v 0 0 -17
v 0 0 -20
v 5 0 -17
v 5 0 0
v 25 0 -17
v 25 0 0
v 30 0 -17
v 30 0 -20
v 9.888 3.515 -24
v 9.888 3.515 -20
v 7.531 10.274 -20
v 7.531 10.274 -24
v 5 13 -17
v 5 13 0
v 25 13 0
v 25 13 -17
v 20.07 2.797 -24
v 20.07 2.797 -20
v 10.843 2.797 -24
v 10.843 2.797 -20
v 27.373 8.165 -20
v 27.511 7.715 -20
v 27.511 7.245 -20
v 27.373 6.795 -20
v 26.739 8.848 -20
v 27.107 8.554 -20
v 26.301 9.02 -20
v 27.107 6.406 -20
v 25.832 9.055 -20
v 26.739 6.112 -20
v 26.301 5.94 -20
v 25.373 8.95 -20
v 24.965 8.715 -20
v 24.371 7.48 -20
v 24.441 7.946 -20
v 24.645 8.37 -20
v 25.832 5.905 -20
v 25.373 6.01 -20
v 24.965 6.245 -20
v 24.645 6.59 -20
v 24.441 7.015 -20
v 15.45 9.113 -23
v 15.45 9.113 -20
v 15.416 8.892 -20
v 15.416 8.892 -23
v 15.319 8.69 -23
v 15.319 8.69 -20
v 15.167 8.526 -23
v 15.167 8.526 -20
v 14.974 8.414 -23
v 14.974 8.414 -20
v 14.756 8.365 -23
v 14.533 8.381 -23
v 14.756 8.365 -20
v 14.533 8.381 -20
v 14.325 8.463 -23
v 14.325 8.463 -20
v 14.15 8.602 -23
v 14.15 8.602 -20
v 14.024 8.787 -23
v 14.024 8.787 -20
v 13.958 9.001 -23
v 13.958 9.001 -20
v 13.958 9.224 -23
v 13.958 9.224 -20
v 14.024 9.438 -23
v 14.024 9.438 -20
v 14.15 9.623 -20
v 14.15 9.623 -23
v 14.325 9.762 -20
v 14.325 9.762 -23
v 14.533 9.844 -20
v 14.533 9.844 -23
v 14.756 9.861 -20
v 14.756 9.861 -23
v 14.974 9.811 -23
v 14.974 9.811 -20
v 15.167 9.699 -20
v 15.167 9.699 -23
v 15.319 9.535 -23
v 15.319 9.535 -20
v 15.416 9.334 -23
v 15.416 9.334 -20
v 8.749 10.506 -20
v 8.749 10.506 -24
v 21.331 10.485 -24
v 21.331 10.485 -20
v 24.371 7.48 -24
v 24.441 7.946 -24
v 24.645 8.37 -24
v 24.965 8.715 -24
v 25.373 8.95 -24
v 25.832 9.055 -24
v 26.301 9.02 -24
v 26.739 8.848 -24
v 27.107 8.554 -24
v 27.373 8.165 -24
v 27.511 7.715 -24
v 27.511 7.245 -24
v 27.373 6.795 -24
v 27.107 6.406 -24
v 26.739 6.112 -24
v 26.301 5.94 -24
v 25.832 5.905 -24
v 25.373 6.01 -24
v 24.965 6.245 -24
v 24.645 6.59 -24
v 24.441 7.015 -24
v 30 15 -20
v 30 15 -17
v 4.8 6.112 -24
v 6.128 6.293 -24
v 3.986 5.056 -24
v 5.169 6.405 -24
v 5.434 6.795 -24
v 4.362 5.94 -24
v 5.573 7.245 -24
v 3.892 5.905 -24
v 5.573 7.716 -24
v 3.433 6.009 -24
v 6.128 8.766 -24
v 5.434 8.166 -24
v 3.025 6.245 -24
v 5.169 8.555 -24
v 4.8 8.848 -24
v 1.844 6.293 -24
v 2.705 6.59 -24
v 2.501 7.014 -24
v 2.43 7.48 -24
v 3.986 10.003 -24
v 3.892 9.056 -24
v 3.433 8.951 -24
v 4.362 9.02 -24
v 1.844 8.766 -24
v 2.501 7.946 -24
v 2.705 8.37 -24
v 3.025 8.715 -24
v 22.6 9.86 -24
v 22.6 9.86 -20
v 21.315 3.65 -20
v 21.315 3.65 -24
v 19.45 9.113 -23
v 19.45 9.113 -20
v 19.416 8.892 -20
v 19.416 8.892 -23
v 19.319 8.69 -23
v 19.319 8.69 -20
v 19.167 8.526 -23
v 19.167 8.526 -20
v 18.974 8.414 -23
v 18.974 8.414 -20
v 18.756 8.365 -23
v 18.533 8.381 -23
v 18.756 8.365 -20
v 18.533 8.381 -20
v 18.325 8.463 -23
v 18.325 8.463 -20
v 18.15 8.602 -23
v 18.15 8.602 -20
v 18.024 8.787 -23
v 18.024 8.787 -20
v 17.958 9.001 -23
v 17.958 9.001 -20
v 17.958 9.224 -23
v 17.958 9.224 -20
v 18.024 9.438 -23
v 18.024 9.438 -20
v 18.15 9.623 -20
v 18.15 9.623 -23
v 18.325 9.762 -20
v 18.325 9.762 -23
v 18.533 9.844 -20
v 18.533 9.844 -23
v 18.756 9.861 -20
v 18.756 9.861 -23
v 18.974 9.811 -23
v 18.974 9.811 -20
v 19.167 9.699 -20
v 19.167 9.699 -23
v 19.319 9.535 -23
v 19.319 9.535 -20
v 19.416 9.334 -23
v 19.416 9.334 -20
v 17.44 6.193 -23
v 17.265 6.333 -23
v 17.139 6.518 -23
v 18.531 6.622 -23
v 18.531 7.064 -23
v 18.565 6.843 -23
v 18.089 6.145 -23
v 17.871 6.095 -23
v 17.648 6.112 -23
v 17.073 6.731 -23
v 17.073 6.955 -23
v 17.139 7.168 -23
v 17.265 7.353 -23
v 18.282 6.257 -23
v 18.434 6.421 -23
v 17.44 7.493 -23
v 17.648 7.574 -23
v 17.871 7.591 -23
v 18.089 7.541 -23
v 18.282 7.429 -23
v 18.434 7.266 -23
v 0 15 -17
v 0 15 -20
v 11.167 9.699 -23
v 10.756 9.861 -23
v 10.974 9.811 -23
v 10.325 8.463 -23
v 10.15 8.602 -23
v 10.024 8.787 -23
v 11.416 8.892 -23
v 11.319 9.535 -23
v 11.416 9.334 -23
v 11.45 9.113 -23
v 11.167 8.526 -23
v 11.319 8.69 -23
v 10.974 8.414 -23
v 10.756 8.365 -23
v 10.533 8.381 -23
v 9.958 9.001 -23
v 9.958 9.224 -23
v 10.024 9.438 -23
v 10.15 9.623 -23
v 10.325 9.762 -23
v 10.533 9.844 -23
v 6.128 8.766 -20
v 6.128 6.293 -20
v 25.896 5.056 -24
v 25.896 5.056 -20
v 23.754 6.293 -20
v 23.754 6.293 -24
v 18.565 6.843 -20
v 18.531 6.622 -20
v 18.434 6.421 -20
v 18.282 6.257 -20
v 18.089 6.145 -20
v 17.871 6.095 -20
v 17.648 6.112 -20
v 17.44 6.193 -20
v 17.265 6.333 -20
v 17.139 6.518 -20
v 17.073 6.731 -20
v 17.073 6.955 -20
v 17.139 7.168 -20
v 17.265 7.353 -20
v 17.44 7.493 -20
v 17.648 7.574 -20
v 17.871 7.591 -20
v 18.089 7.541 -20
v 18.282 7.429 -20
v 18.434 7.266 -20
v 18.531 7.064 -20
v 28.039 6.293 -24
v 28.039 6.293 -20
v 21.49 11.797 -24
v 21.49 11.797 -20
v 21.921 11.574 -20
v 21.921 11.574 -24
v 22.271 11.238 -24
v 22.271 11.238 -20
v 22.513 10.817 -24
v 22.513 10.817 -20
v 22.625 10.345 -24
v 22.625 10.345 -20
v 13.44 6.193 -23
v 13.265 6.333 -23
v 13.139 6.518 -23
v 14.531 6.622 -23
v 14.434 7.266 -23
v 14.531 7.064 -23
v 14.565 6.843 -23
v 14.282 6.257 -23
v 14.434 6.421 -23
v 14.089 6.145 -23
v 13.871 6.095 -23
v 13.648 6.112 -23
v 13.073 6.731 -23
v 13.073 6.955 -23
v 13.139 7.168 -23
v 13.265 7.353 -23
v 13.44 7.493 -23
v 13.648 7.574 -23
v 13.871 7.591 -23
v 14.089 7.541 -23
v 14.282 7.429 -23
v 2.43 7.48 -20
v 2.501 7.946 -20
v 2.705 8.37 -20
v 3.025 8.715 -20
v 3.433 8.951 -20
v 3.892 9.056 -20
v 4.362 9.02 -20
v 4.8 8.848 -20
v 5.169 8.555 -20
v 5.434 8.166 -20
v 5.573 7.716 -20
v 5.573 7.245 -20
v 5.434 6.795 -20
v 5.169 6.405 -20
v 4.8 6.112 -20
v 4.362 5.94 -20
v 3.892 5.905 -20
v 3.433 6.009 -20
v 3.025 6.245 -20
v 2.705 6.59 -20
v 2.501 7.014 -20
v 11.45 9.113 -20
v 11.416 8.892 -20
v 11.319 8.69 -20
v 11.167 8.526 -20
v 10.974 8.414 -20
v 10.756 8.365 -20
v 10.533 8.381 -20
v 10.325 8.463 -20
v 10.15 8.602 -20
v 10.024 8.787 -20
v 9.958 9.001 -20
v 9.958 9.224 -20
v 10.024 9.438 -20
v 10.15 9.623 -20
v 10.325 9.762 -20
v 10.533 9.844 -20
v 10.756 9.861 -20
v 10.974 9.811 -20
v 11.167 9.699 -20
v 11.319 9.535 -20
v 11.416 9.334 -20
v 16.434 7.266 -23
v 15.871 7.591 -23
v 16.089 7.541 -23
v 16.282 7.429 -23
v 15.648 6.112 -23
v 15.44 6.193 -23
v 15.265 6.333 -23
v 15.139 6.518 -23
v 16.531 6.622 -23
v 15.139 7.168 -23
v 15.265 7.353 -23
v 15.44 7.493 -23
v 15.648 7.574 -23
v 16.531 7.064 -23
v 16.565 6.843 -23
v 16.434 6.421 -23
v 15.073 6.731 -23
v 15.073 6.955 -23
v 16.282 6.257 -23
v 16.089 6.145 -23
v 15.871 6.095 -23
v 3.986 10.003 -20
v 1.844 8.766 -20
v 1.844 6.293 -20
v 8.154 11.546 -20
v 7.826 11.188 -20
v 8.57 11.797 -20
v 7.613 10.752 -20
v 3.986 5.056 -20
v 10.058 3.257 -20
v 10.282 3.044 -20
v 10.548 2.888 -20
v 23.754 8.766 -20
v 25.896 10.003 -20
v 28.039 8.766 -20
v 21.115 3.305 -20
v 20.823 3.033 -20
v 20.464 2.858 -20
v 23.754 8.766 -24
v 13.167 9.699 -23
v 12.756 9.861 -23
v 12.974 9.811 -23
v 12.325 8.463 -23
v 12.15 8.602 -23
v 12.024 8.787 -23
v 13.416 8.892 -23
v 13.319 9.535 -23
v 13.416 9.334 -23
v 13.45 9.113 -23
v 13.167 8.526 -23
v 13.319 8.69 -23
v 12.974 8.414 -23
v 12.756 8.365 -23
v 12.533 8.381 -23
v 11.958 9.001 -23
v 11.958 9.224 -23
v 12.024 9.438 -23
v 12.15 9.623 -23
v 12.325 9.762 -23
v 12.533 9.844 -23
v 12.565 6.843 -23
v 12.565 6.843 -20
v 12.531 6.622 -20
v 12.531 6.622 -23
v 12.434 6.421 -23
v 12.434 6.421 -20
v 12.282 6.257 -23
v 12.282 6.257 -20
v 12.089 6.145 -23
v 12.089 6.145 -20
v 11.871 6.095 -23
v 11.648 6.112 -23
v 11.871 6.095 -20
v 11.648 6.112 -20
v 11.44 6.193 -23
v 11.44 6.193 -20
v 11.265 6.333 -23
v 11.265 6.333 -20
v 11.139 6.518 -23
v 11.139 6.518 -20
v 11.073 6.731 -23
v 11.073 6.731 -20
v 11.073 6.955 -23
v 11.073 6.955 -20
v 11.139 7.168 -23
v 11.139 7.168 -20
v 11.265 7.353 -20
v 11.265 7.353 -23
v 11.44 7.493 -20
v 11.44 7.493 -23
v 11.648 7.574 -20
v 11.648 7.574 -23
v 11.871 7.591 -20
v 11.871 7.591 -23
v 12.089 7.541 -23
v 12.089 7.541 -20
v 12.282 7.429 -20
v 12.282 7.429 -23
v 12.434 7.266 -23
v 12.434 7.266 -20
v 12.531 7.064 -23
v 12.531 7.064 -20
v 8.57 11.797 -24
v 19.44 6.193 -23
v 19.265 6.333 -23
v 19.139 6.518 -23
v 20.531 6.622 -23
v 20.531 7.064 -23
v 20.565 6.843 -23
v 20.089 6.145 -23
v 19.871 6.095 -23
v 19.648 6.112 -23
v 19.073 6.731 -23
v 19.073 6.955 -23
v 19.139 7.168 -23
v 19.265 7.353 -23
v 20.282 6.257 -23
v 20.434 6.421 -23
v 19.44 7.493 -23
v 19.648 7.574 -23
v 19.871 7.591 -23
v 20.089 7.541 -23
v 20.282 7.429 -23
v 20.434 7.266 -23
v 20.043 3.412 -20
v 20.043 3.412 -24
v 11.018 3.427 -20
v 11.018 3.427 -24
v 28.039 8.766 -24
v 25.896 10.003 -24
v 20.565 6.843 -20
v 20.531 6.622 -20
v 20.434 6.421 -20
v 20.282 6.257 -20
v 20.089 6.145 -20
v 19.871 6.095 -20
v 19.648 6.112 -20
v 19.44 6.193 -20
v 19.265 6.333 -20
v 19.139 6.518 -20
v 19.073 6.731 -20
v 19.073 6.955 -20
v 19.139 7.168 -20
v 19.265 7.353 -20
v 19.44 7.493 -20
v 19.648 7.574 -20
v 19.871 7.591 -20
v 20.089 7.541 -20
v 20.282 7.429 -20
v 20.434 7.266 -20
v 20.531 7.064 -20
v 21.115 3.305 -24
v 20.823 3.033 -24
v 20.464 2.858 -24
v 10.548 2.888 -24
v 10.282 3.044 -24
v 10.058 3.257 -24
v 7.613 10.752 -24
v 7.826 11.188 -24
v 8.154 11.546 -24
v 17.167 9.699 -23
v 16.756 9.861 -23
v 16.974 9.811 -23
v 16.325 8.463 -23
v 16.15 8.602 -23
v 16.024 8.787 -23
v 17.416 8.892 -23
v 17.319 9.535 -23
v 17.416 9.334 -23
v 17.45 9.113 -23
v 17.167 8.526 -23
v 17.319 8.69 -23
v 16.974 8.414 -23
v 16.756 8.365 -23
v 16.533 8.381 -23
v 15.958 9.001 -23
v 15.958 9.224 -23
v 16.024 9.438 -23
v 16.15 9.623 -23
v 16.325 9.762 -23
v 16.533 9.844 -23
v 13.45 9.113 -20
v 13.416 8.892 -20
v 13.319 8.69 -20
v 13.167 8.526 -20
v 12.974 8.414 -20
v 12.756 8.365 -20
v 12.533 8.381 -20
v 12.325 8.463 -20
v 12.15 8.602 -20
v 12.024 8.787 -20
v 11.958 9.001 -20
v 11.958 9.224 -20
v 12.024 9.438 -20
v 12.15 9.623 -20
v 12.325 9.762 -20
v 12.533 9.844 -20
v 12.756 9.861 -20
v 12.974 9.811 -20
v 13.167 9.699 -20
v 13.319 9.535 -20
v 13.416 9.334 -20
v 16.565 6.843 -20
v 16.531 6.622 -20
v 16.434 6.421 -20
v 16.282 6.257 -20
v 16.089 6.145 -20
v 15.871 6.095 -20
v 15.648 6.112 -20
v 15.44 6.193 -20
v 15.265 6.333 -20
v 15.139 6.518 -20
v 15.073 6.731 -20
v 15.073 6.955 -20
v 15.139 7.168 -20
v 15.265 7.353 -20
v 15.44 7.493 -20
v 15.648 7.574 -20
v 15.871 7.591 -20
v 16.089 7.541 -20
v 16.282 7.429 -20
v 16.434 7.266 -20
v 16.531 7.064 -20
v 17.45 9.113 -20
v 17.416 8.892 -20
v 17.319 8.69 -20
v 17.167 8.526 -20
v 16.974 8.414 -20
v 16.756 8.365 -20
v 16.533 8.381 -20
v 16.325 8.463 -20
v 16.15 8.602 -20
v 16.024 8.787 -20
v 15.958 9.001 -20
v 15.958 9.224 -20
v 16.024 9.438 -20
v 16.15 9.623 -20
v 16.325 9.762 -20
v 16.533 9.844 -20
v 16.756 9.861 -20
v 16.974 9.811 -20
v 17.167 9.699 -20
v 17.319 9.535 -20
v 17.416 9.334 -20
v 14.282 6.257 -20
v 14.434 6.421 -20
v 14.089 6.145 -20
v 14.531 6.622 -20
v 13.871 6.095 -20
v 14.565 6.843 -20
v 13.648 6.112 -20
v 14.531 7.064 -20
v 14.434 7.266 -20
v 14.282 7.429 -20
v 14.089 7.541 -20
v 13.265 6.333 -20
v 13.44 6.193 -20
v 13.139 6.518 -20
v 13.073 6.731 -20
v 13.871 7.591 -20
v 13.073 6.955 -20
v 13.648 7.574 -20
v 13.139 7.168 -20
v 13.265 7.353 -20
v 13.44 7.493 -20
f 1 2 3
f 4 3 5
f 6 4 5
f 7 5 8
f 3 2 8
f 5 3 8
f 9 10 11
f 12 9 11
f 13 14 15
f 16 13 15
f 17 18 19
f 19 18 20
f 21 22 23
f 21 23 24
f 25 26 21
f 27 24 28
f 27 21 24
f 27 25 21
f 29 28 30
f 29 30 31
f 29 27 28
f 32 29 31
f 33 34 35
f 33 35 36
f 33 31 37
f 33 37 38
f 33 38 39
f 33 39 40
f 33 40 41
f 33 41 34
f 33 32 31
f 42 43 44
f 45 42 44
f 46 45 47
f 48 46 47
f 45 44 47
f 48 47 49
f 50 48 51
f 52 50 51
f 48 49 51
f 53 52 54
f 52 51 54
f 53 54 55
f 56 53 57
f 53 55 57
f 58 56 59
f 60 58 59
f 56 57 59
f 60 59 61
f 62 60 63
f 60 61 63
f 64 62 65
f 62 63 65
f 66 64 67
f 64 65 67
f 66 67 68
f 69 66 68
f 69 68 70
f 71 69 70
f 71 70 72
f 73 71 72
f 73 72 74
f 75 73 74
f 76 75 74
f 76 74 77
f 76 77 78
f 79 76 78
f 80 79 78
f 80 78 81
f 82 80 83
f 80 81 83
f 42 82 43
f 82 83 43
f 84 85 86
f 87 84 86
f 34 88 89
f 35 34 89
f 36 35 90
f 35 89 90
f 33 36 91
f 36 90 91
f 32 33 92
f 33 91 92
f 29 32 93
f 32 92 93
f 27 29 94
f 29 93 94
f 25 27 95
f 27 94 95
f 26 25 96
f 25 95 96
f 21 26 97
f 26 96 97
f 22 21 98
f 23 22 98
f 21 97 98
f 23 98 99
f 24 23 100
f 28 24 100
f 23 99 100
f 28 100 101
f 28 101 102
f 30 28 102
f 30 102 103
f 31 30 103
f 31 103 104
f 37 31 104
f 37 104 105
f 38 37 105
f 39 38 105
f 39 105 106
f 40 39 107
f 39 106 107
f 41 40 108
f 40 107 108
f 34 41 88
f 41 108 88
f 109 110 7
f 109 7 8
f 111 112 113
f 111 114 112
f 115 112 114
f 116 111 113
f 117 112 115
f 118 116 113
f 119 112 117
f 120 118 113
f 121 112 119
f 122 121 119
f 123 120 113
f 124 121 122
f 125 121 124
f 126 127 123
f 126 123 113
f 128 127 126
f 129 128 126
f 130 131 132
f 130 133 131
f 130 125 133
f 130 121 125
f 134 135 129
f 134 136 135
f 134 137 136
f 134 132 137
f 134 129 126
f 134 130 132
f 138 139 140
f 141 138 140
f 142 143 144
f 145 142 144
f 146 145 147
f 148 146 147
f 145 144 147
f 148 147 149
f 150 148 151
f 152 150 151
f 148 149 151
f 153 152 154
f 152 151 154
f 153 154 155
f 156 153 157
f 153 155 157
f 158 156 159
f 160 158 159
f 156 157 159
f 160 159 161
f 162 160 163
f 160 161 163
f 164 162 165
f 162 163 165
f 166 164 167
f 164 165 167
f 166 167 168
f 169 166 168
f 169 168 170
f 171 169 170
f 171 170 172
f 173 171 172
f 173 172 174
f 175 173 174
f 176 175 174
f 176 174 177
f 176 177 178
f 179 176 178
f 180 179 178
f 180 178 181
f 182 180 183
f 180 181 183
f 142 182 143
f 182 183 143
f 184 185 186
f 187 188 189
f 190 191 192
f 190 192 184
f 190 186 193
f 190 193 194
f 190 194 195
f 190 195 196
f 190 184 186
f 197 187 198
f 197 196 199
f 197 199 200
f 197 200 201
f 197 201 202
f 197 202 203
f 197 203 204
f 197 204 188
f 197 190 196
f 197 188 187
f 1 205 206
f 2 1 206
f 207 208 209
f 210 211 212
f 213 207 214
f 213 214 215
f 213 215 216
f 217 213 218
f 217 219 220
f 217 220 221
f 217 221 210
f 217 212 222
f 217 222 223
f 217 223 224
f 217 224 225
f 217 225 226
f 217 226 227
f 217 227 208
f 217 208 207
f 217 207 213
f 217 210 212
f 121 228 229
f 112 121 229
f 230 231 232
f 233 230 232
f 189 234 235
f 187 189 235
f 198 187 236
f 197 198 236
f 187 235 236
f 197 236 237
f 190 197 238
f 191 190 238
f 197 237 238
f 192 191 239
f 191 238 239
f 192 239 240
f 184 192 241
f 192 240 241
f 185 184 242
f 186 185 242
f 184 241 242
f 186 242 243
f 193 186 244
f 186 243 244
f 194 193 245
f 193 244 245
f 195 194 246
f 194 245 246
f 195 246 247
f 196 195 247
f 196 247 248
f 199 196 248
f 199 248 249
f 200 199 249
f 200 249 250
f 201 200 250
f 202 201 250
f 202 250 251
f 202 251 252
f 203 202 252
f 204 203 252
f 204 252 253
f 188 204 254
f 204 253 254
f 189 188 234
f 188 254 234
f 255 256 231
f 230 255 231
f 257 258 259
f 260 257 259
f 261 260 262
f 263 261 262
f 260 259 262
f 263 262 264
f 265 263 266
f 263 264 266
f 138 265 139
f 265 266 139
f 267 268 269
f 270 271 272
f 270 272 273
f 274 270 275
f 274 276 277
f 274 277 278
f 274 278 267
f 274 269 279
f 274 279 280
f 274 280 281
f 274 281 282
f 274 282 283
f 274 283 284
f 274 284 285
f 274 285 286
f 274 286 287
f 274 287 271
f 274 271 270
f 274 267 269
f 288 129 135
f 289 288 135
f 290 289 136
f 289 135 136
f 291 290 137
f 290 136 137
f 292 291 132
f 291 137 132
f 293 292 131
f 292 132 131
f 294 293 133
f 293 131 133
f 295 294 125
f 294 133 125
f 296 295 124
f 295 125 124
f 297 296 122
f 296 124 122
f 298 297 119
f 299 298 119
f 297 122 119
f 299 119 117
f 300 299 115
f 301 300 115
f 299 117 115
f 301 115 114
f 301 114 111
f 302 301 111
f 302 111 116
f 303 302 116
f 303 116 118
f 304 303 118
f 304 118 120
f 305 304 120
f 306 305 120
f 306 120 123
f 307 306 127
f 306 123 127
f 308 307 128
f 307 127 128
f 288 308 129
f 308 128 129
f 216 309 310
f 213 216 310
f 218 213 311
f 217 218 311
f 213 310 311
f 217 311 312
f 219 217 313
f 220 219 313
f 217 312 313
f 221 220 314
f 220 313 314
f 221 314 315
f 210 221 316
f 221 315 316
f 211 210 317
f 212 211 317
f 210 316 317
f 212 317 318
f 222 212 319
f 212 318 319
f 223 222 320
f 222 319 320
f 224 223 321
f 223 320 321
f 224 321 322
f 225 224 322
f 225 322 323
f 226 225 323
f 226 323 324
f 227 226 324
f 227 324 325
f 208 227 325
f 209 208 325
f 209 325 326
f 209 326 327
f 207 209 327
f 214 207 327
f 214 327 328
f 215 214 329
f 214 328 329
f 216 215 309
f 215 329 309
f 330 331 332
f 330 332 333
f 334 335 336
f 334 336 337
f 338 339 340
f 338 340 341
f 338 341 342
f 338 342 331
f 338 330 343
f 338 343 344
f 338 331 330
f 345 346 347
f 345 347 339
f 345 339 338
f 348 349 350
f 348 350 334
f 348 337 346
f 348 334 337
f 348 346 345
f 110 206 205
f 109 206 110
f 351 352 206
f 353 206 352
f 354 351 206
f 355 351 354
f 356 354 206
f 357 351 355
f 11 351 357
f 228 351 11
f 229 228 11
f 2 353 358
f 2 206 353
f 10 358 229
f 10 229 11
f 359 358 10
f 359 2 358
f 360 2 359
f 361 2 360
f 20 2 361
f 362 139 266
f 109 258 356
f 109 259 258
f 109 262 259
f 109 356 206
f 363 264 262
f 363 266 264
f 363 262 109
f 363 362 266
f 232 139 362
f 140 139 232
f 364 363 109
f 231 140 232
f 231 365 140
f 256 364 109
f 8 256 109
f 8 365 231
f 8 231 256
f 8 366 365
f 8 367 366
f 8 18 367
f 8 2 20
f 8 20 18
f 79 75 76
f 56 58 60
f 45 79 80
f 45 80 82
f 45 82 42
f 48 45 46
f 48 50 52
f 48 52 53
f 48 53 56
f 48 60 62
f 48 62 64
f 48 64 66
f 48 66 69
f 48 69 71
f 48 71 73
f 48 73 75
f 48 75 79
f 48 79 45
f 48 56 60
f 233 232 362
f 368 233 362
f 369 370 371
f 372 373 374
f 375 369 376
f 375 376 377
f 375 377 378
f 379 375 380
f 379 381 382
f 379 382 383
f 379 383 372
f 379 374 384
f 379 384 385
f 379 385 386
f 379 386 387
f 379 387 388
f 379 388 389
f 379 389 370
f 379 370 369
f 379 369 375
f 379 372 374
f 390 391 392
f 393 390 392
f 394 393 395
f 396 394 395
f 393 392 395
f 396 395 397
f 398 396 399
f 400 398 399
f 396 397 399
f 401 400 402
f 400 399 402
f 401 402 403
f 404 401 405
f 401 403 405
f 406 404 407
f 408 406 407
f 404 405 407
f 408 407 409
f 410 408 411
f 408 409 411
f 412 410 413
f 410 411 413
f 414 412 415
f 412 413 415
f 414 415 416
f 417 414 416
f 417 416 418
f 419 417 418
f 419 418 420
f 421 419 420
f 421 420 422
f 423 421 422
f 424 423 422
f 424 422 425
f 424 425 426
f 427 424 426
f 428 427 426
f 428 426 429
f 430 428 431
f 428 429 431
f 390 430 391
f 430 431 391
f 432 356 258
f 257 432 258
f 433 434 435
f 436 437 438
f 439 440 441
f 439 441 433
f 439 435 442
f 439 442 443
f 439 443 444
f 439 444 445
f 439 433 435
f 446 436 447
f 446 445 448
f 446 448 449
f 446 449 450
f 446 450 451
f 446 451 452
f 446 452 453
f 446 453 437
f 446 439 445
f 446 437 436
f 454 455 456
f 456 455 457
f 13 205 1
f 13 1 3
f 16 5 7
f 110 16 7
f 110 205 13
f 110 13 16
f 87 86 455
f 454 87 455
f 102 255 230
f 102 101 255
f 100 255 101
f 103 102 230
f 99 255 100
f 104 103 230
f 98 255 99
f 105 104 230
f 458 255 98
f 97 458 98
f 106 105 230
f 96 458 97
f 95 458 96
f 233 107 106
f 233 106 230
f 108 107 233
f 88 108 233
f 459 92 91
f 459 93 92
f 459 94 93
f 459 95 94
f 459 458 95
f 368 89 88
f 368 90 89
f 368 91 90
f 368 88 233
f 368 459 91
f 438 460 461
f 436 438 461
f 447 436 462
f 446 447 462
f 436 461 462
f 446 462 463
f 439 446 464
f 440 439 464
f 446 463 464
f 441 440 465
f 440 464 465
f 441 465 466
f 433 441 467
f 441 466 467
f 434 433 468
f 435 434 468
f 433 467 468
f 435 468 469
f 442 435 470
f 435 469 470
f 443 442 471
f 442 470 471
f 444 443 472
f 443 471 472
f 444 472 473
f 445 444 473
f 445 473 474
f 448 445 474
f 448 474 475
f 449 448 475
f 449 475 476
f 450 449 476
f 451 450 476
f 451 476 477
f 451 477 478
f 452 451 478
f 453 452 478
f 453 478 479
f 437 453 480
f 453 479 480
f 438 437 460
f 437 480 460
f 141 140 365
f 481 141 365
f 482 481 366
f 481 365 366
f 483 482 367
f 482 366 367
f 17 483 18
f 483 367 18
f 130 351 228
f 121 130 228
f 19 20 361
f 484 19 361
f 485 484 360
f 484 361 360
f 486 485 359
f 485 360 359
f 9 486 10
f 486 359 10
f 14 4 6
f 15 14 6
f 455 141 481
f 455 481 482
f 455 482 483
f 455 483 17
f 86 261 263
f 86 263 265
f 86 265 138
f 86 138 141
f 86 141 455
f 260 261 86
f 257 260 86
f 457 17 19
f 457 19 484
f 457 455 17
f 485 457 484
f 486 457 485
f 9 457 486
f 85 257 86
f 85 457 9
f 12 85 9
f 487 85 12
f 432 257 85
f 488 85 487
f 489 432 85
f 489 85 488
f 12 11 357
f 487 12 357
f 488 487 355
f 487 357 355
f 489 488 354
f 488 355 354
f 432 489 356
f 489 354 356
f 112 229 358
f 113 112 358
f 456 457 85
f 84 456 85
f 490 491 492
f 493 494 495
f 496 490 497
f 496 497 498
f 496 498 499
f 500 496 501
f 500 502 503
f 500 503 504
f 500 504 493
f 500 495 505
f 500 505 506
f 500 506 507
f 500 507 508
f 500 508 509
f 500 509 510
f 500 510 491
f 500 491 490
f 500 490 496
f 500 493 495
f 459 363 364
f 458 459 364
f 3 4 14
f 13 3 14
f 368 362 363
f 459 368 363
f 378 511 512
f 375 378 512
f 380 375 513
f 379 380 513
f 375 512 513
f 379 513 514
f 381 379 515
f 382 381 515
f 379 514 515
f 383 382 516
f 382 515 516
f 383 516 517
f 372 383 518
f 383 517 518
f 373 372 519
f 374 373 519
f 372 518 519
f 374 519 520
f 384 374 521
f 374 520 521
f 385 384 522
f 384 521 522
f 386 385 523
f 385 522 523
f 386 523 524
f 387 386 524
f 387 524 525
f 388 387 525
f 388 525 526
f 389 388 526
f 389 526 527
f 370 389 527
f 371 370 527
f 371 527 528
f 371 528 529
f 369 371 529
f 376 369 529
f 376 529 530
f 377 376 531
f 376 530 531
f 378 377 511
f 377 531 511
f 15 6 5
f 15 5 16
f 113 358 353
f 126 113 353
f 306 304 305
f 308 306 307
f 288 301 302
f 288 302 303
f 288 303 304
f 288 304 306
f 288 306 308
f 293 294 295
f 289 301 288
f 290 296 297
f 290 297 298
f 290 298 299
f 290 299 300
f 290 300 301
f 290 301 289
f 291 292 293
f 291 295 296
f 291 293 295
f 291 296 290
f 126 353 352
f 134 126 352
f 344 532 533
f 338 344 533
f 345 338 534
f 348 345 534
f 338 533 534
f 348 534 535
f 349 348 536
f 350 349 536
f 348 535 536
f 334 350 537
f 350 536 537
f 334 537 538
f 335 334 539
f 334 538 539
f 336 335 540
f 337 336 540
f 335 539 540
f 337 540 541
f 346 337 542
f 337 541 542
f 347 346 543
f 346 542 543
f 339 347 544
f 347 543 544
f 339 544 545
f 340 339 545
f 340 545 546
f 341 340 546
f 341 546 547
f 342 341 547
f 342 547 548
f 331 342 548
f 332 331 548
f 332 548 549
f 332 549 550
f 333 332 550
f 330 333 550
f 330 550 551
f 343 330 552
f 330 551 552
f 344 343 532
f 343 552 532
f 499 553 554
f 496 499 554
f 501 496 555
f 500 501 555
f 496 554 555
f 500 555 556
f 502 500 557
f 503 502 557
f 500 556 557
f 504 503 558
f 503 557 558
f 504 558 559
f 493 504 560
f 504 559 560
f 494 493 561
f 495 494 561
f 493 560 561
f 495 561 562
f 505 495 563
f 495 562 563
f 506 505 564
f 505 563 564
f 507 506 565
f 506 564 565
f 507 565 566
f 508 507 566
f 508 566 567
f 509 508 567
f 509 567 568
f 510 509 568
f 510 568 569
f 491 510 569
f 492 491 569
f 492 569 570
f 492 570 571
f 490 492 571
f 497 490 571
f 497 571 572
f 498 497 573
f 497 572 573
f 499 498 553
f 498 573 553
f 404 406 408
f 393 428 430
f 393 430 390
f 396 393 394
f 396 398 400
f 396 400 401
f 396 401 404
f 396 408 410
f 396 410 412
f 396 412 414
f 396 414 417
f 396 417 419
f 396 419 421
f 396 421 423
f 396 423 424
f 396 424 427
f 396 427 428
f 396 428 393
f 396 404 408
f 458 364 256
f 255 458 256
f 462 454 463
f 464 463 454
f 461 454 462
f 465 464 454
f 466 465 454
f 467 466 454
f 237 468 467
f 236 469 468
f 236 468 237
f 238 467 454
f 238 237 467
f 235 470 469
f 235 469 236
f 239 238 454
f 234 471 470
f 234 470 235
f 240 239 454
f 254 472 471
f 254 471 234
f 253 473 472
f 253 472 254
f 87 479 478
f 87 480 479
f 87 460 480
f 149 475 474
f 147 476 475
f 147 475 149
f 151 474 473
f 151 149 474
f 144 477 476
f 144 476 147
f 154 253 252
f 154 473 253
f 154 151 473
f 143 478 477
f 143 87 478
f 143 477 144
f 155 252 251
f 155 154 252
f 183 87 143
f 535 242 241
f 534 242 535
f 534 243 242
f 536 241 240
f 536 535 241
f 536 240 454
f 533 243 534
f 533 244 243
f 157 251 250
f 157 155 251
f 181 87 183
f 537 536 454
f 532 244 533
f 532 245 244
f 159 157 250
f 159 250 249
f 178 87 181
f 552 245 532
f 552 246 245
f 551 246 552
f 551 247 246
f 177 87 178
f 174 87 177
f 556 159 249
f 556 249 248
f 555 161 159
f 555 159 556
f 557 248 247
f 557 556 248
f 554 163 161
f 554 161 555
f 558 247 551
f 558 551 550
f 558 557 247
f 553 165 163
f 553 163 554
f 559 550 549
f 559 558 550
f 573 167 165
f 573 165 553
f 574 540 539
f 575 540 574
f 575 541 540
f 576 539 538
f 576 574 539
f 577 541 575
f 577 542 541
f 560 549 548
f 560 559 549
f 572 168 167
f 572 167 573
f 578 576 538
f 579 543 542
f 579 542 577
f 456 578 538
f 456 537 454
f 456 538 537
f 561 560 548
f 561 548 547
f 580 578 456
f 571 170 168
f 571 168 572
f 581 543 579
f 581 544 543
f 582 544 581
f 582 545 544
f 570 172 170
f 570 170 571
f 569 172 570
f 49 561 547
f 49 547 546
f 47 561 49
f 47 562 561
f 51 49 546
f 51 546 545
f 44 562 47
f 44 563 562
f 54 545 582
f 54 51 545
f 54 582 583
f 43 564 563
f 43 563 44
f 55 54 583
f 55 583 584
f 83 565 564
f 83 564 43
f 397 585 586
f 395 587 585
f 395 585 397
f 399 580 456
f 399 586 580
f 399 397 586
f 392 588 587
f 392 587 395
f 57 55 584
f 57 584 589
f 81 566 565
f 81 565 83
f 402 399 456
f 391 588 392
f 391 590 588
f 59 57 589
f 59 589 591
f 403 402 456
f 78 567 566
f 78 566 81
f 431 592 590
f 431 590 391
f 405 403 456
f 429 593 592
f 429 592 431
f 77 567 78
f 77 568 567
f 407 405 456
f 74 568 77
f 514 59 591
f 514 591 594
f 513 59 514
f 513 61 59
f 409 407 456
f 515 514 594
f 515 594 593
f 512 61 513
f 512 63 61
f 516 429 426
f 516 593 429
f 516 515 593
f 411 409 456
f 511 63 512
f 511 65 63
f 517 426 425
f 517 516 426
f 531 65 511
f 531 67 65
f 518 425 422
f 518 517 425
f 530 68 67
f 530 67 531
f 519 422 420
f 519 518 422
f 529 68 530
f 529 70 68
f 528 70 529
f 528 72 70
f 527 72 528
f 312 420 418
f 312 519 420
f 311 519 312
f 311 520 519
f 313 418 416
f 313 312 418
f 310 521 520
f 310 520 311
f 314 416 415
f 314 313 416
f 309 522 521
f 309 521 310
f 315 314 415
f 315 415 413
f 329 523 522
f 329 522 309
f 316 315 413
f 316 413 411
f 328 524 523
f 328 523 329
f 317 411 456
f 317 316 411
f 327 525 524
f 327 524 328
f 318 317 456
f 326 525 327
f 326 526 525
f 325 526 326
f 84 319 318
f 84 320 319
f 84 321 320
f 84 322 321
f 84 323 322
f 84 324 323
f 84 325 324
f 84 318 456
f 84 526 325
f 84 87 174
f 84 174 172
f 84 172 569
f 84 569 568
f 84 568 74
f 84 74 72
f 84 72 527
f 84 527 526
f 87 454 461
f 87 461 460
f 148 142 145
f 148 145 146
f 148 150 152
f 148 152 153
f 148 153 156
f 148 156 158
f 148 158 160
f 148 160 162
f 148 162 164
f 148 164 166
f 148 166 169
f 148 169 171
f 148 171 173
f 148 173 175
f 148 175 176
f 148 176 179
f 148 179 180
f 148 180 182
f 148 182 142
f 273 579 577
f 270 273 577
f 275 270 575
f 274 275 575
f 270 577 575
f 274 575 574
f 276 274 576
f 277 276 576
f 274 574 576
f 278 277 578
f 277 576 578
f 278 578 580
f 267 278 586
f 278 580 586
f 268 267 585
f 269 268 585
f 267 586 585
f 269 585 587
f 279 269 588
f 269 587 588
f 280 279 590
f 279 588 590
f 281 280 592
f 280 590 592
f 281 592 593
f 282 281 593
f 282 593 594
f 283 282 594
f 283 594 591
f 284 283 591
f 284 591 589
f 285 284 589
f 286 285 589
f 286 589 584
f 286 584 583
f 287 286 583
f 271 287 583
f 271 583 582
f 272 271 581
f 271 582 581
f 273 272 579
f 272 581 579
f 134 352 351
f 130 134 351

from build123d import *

# Parameters (mm, degrees)
SKETCH1_W           = 30
SKETCH1_H           = 20
BOSS_EXTRUDE1_DEPTH = 15
SKETCH2_W           = 5
SKETCH2_H           = 15
CUT_EXTRUDE4_DEPTH  = 17
SKETCH3_W           = 20
SKETCH3_H           = 2
CUT_EXTRUDE5_DEPTH  = 17
BOSS_EXTRUDE3_DEPTH = 4
BOSS_EXTRUDE4_DEPTH = 4
SKETCH8_R           = 1.579197179
SKETCH8_R_2         = 1.58
CUT_EXTRUDE8_DEPTH  = 4
CUT_EXTRUDE12_DEPTH = 4
SKETCH10_R          = 0.75
BOSS_EXTRUDE5_DEPTH = 3


with BuildPart() as part:
    # Sketch1 → Boss-Extrude1 (new body)
    with BuildSketch(Plane(origin=(0, 0, 0), x_dir=(1, 0, 0), z_dir=(0, 1, 0))):
        with Locations((15, 10)):
            Rectangle(SKETCH1_W, SKETCH1_H)
    extrude(amount=BOSS_EXTRUDE1_DEPTH)

    # Sketch2 → Cut-Extrude4 (cut)
    with BuildSketch(Plane.XY):
        with Locations((27.5, 7.5)):
            Rectangle(SKETCH2_W, SKETCH2_H)
        with Locations((2.5, 7.5)):
            Rectangle(SKETCH2_W, SKETCH2_H)
    extrude(amount=-CUT_EXTRUDE4_DEPTH, mode=Mode.SUBTRACT)

    # Sketch3 → Cut-Extrude5 (cut)
    with BuildSketch(Plane.XY):
        with Locations((15, 14)):
            Rectangle(SKETCH3_W, SKETCH3_H)
    extrude(amount=-CUT_EXTRUDE5_DEPTH, mode=Mode.SUBTRACT)

    # Sketch6 → Boss-Extrude3 (add)
    with BuildSketch(Plane(origin=(0, 0, -20), x_dir=(-1, 0, 0), z_dir=(0, 0, -1))):
        with BuildLine():
            Line((-8.569503225, 11.796579234), (-21.490222751, 11.796579234))
            ThreePointArc((-21.490222751, 11.796579234), (-22.407058542, 11.036037401), (-22.599660768, 9.860488113))
            Line((-22.599660768, 9.860488113), (-21.315495161, 3.650100945))
            ThreePointArc((-21.315495161, 3.650100945), (-20.823120618, 3.032864625), (-20.069739851, 2.796579234))
            Line((-20.069739851, 2.796579234), (-10.84314976, 2.796579234))
            ThreePointArc((-10.84314976, 2.796579234), (-10.281938841, 3.044467569), (-9.88839036, 3.515132967))
            Line((-9.88839036, 3.515132967), (-7.531107534, 10.273814665))
            ThreePointArc((-7.531107534, 10.273814665), (-7.826028971, 11.188134351), (-8.569503225, 11.796579234))
        make_face()
    extrude(amount=BOSS_EXTRUDE3_DEPTH)

    # Sketch7 → Boss-Extrude4 (add)
    with BuildSketch(Plane(origin=(0, 0, -20), x_dir=(-1, 0, 0), z_dir=(0, 0, -1))):
        Polygon((-3.985927745, 10.00319824), (-6.12825709, 8.766323815), (-6.12825709, 6.292574967), (-3.985927745, 5.055700542), (-1.843598399, 6.292574967), (-1.843598399, 8.766323815), align=None)
        Polygon((-25.896274691, 10.00319824), (-28.038604037, 8.766323815), (-28.038604037, 6.292574967), (-25.896274691, 5.055700542), (-23.753945346, 6.292574967), (-23.753945346, 8.766323815), align=None)
    extrude(amount=BOSS_EXTRUDE4_DEPTH)

    # Sketch8 → Cut-Extrude8 (cut)
    with BuildSketch(Plane(origin=(0, 0, -24), x_dir=(-1, 0, 0), z_dir=(0, 0, -1))):
        with Locations((-25.949762311, 7.480091341)):
            Circle(SKETCH8_R)
        with Locations((-4.010420372, 7.480091341)):
            Circle(SKETCH8_R_2)
    extrude(amount=-CUT_EXTRUDE8_DEPTH, mode=Mode.SUBTRACT)

    # Sketch9 → Cut-Extrude12 (cut)
    with BuildSketch(Plane(origin=(0, 0, -24), x_dir=(-1, 0, 0), z_dir=(0, 0, -1))):
        Polygon((-8.748681153, 10.506207471), (-21.331387013, 10.48502632), (-20.043360928, 3.411896064), (-11.018349356, 3.427088355), align=None)
    extrude(amount=-CUT_EXTRUDE12_DEPTH, mode=Mode.SUBTRACT)

    # Sketch10 → Boss-Extrude5 (add)
    with BuildSketch(Plane(origin=(0, 0, -20), x_dir=(-1, 0, 0), z_dir=(0, 0, -1))):
        with Locations(Location((-10.699729711, 9.112601358, 0), (0, 0, 180))):
            Circle(SKETCH10_R)
        with Locations(Location((-11.814614601, 6.843014261, 0), (0, 0, 180))):
            Circle(SKETCH10_R)
        with Locations(Location((-12.699729711, 9.112601358, 0), (0, 0, 180))):
            Circle(SKETCH10_R)
        with Locations(Location((-13.814614601, 6.843014261, 0), (0, 0, 180))):
            Circle(SKETCH10_R)
        with Locations(Location((-14.699729711, 9.112601358, 0), (0, 0, 180))):
            Circle(SKETCH10_R)
        with Locations(Location((-15.814614601, 6.843014261, 0), (0, 0, 180))):
            Circle(SKETCH10_R)
        with Locations(Location((-16.699729711, 9.112601358, 0), (0, 0, 180))):
            Circle(SKETCH10_R)
        with Locations(Location((-17.814614601, 6.843014261, 0), (0, 0, 180))):
            Circle(SKETCH10_R)
        with Locations(Location((-18.699729711, 9.112601358, 0), (0, 0, 180))):
            Circle(SKETCH10_R)
        with Locations(Location((-19.814614601, 6.843014261, 0), (0, 0, 180))):
            Circle(SKETCH10_R)
    extrude(amount=BOSS_EXTRUDE5_DEPTH)


solid = part.part
